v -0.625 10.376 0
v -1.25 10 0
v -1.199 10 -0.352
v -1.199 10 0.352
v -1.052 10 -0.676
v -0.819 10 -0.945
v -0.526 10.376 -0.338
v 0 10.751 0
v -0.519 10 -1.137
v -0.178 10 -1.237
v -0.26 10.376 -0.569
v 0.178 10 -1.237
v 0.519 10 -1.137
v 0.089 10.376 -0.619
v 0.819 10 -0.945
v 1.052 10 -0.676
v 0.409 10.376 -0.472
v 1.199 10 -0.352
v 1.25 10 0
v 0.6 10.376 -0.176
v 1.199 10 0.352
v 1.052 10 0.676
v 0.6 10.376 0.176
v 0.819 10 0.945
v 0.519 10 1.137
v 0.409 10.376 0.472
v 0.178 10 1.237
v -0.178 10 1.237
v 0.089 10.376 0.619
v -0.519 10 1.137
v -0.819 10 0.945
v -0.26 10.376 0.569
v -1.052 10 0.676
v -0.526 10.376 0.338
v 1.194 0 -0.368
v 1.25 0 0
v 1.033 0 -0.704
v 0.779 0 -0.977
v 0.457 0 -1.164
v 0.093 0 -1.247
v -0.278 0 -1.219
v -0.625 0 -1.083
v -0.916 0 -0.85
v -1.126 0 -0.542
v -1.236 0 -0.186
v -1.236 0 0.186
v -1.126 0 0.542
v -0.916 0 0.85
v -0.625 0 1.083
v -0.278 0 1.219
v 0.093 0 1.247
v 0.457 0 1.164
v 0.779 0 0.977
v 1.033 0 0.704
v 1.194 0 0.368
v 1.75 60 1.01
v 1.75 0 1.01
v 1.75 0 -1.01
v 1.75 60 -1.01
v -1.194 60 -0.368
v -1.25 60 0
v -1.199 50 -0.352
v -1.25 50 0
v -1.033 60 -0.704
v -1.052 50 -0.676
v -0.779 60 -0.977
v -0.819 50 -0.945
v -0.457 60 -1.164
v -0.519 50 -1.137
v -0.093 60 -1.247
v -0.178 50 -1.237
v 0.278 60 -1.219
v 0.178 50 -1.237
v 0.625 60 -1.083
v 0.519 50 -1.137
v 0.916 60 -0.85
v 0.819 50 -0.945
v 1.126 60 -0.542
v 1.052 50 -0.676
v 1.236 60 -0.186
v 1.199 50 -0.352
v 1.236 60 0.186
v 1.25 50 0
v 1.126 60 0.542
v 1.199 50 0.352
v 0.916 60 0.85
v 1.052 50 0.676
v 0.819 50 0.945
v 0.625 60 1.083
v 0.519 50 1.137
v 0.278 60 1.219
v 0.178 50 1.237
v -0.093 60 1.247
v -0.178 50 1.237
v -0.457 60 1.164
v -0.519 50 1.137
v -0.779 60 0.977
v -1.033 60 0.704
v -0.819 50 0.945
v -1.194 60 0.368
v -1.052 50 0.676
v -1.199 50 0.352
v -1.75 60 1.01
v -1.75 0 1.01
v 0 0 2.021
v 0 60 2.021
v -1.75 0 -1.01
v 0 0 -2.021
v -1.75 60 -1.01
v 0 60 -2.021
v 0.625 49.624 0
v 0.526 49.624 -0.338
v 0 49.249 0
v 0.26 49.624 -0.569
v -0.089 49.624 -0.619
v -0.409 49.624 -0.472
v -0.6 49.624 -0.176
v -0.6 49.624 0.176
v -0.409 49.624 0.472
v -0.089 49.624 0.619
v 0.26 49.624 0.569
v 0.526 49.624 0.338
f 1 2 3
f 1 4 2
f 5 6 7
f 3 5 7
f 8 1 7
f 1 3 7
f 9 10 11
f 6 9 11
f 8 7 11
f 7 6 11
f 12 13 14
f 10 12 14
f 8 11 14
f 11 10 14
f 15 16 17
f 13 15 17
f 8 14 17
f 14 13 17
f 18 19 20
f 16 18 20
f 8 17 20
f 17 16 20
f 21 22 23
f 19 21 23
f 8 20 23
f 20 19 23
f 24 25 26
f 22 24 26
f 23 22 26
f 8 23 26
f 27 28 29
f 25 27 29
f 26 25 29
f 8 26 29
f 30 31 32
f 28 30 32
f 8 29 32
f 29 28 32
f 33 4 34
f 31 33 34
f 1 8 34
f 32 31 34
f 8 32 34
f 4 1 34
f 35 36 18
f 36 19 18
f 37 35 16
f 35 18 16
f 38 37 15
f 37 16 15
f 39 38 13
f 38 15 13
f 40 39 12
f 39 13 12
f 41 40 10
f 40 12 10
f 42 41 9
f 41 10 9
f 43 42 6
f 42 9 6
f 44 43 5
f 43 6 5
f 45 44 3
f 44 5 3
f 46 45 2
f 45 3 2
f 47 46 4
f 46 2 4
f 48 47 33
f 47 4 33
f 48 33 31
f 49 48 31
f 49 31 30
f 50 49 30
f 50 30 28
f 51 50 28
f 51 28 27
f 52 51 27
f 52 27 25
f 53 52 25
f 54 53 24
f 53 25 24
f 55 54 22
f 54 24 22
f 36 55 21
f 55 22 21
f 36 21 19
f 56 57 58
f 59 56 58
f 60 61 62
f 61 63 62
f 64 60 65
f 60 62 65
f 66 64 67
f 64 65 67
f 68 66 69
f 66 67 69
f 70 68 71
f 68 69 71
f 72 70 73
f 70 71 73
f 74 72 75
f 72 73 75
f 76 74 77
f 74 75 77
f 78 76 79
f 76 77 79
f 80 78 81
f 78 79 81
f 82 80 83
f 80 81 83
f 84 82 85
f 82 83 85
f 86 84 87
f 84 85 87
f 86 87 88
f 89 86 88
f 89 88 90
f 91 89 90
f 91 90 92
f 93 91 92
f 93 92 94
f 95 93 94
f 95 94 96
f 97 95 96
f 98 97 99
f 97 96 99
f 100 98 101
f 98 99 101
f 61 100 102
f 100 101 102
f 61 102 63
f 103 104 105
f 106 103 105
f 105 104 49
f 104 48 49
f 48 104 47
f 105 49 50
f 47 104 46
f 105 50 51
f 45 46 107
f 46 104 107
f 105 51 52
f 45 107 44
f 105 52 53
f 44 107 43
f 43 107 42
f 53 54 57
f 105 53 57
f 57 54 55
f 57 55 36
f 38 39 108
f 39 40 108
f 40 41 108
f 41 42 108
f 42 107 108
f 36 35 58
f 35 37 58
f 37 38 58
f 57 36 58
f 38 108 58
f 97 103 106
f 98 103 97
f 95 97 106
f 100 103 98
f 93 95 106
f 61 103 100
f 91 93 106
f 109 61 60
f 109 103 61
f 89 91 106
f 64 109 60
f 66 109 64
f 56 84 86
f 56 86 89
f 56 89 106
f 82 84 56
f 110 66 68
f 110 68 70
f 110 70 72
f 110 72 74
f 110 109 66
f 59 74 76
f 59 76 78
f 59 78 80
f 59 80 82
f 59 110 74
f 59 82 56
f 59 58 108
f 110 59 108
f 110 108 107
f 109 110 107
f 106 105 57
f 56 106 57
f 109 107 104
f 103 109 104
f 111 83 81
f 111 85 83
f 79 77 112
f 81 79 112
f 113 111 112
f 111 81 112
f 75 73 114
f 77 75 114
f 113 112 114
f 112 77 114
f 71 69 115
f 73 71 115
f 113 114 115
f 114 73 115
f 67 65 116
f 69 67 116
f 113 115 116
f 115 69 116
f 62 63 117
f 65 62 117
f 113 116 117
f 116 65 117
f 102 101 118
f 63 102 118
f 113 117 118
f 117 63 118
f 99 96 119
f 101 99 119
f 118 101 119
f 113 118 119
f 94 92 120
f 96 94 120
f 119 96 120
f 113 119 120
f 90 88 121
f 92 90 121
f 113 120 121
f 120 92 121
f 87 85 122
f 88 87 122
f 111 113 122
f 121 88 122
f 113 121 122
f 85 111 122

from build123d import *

# Parameters (mm, degrees)
BOSS_EXTRUDE1_DEPTH       = 60
M3X0_5_TAPPED_HOLE1_D     = 2.5
M3X0_5_TAPPED_HOLE1_DEPTH = 10
M3X0_5_TAPPED_HOLE1_TIP   = 0.751075774
M3X0_5_TAPPED_HOLE2_D     = 2.5
M3X0_5_TAPPED_HOLE2_DEPTH = 10
M3X0_5_TAPPED_HOLE2_TIP   = 0.751075774


with BuildPart() as part:
    # Sketch1 → Boss-Extrude1 (new body)
    with BuildSketch(Plane(origin=(0, 0, 0), x_dir=(1, 0, 0), z_dir=(0, 1, 0))):
        Polygon((0, 2.020725942), (-1.75, 1.010362971), (-1.75, -1.010362971), (0, -2.020725942), (1.75, -1.010362971), (1.75, 1.010362971), align=None)
    extrude(amount=BOSS_EXTRUDE1_DEPTH)

    # M3x0.5 Tapped Hole1
    with Locations(Plane(origin=(0, 60, 0), x_dir=(1, 0, 0), z_dir=(0, 1, 0))):
        with Locations((0, 0)):
            Hole(M3X0_5_TAPPED_HOLE1_D / 2, depth=M3X0_5_TAPPED_HOLE1_DEPTH)
            with Locations((0, 0, -(M3X0_5_TAPPED_HOLE1_DEPTH + M3X0_5_TAPPED_HOLE1_TIP / 2))):  # 118° drill point
                Cone(0, M3X0_5_TAPPED_HOLE1_D / 2, M3X0_5_TAPPED_HOLE1_TIP, mode=Mode.SUBTRACT)

    # M3x0.5 Tapped Hole2
    with Locations(Plane(origin=(0, 0, 0), x_dir=(-1, 0, 0), z_dir=(0, -1, 0))):
        with Locations((0, 0)):
            Hole(M3X0_5_TAPPED_HOLE2_D / 2, depth=M3X0_5_TAPPED_HOLE2_DEPTH)
            with Locations((0, 0, -(M3X0_5_TAPPED_HOLE2_DEPTH + M3X0_5_TAPPED_HOLE2_TIP / 2))):  # 118° drill point
                Cone(0, M3X0_5_TAPPED_HOLE2_D / 2, M3X0_5_TAPPED_HOLE2_TIP, mode=Mode.SUBTRACT)


solid = part.part
